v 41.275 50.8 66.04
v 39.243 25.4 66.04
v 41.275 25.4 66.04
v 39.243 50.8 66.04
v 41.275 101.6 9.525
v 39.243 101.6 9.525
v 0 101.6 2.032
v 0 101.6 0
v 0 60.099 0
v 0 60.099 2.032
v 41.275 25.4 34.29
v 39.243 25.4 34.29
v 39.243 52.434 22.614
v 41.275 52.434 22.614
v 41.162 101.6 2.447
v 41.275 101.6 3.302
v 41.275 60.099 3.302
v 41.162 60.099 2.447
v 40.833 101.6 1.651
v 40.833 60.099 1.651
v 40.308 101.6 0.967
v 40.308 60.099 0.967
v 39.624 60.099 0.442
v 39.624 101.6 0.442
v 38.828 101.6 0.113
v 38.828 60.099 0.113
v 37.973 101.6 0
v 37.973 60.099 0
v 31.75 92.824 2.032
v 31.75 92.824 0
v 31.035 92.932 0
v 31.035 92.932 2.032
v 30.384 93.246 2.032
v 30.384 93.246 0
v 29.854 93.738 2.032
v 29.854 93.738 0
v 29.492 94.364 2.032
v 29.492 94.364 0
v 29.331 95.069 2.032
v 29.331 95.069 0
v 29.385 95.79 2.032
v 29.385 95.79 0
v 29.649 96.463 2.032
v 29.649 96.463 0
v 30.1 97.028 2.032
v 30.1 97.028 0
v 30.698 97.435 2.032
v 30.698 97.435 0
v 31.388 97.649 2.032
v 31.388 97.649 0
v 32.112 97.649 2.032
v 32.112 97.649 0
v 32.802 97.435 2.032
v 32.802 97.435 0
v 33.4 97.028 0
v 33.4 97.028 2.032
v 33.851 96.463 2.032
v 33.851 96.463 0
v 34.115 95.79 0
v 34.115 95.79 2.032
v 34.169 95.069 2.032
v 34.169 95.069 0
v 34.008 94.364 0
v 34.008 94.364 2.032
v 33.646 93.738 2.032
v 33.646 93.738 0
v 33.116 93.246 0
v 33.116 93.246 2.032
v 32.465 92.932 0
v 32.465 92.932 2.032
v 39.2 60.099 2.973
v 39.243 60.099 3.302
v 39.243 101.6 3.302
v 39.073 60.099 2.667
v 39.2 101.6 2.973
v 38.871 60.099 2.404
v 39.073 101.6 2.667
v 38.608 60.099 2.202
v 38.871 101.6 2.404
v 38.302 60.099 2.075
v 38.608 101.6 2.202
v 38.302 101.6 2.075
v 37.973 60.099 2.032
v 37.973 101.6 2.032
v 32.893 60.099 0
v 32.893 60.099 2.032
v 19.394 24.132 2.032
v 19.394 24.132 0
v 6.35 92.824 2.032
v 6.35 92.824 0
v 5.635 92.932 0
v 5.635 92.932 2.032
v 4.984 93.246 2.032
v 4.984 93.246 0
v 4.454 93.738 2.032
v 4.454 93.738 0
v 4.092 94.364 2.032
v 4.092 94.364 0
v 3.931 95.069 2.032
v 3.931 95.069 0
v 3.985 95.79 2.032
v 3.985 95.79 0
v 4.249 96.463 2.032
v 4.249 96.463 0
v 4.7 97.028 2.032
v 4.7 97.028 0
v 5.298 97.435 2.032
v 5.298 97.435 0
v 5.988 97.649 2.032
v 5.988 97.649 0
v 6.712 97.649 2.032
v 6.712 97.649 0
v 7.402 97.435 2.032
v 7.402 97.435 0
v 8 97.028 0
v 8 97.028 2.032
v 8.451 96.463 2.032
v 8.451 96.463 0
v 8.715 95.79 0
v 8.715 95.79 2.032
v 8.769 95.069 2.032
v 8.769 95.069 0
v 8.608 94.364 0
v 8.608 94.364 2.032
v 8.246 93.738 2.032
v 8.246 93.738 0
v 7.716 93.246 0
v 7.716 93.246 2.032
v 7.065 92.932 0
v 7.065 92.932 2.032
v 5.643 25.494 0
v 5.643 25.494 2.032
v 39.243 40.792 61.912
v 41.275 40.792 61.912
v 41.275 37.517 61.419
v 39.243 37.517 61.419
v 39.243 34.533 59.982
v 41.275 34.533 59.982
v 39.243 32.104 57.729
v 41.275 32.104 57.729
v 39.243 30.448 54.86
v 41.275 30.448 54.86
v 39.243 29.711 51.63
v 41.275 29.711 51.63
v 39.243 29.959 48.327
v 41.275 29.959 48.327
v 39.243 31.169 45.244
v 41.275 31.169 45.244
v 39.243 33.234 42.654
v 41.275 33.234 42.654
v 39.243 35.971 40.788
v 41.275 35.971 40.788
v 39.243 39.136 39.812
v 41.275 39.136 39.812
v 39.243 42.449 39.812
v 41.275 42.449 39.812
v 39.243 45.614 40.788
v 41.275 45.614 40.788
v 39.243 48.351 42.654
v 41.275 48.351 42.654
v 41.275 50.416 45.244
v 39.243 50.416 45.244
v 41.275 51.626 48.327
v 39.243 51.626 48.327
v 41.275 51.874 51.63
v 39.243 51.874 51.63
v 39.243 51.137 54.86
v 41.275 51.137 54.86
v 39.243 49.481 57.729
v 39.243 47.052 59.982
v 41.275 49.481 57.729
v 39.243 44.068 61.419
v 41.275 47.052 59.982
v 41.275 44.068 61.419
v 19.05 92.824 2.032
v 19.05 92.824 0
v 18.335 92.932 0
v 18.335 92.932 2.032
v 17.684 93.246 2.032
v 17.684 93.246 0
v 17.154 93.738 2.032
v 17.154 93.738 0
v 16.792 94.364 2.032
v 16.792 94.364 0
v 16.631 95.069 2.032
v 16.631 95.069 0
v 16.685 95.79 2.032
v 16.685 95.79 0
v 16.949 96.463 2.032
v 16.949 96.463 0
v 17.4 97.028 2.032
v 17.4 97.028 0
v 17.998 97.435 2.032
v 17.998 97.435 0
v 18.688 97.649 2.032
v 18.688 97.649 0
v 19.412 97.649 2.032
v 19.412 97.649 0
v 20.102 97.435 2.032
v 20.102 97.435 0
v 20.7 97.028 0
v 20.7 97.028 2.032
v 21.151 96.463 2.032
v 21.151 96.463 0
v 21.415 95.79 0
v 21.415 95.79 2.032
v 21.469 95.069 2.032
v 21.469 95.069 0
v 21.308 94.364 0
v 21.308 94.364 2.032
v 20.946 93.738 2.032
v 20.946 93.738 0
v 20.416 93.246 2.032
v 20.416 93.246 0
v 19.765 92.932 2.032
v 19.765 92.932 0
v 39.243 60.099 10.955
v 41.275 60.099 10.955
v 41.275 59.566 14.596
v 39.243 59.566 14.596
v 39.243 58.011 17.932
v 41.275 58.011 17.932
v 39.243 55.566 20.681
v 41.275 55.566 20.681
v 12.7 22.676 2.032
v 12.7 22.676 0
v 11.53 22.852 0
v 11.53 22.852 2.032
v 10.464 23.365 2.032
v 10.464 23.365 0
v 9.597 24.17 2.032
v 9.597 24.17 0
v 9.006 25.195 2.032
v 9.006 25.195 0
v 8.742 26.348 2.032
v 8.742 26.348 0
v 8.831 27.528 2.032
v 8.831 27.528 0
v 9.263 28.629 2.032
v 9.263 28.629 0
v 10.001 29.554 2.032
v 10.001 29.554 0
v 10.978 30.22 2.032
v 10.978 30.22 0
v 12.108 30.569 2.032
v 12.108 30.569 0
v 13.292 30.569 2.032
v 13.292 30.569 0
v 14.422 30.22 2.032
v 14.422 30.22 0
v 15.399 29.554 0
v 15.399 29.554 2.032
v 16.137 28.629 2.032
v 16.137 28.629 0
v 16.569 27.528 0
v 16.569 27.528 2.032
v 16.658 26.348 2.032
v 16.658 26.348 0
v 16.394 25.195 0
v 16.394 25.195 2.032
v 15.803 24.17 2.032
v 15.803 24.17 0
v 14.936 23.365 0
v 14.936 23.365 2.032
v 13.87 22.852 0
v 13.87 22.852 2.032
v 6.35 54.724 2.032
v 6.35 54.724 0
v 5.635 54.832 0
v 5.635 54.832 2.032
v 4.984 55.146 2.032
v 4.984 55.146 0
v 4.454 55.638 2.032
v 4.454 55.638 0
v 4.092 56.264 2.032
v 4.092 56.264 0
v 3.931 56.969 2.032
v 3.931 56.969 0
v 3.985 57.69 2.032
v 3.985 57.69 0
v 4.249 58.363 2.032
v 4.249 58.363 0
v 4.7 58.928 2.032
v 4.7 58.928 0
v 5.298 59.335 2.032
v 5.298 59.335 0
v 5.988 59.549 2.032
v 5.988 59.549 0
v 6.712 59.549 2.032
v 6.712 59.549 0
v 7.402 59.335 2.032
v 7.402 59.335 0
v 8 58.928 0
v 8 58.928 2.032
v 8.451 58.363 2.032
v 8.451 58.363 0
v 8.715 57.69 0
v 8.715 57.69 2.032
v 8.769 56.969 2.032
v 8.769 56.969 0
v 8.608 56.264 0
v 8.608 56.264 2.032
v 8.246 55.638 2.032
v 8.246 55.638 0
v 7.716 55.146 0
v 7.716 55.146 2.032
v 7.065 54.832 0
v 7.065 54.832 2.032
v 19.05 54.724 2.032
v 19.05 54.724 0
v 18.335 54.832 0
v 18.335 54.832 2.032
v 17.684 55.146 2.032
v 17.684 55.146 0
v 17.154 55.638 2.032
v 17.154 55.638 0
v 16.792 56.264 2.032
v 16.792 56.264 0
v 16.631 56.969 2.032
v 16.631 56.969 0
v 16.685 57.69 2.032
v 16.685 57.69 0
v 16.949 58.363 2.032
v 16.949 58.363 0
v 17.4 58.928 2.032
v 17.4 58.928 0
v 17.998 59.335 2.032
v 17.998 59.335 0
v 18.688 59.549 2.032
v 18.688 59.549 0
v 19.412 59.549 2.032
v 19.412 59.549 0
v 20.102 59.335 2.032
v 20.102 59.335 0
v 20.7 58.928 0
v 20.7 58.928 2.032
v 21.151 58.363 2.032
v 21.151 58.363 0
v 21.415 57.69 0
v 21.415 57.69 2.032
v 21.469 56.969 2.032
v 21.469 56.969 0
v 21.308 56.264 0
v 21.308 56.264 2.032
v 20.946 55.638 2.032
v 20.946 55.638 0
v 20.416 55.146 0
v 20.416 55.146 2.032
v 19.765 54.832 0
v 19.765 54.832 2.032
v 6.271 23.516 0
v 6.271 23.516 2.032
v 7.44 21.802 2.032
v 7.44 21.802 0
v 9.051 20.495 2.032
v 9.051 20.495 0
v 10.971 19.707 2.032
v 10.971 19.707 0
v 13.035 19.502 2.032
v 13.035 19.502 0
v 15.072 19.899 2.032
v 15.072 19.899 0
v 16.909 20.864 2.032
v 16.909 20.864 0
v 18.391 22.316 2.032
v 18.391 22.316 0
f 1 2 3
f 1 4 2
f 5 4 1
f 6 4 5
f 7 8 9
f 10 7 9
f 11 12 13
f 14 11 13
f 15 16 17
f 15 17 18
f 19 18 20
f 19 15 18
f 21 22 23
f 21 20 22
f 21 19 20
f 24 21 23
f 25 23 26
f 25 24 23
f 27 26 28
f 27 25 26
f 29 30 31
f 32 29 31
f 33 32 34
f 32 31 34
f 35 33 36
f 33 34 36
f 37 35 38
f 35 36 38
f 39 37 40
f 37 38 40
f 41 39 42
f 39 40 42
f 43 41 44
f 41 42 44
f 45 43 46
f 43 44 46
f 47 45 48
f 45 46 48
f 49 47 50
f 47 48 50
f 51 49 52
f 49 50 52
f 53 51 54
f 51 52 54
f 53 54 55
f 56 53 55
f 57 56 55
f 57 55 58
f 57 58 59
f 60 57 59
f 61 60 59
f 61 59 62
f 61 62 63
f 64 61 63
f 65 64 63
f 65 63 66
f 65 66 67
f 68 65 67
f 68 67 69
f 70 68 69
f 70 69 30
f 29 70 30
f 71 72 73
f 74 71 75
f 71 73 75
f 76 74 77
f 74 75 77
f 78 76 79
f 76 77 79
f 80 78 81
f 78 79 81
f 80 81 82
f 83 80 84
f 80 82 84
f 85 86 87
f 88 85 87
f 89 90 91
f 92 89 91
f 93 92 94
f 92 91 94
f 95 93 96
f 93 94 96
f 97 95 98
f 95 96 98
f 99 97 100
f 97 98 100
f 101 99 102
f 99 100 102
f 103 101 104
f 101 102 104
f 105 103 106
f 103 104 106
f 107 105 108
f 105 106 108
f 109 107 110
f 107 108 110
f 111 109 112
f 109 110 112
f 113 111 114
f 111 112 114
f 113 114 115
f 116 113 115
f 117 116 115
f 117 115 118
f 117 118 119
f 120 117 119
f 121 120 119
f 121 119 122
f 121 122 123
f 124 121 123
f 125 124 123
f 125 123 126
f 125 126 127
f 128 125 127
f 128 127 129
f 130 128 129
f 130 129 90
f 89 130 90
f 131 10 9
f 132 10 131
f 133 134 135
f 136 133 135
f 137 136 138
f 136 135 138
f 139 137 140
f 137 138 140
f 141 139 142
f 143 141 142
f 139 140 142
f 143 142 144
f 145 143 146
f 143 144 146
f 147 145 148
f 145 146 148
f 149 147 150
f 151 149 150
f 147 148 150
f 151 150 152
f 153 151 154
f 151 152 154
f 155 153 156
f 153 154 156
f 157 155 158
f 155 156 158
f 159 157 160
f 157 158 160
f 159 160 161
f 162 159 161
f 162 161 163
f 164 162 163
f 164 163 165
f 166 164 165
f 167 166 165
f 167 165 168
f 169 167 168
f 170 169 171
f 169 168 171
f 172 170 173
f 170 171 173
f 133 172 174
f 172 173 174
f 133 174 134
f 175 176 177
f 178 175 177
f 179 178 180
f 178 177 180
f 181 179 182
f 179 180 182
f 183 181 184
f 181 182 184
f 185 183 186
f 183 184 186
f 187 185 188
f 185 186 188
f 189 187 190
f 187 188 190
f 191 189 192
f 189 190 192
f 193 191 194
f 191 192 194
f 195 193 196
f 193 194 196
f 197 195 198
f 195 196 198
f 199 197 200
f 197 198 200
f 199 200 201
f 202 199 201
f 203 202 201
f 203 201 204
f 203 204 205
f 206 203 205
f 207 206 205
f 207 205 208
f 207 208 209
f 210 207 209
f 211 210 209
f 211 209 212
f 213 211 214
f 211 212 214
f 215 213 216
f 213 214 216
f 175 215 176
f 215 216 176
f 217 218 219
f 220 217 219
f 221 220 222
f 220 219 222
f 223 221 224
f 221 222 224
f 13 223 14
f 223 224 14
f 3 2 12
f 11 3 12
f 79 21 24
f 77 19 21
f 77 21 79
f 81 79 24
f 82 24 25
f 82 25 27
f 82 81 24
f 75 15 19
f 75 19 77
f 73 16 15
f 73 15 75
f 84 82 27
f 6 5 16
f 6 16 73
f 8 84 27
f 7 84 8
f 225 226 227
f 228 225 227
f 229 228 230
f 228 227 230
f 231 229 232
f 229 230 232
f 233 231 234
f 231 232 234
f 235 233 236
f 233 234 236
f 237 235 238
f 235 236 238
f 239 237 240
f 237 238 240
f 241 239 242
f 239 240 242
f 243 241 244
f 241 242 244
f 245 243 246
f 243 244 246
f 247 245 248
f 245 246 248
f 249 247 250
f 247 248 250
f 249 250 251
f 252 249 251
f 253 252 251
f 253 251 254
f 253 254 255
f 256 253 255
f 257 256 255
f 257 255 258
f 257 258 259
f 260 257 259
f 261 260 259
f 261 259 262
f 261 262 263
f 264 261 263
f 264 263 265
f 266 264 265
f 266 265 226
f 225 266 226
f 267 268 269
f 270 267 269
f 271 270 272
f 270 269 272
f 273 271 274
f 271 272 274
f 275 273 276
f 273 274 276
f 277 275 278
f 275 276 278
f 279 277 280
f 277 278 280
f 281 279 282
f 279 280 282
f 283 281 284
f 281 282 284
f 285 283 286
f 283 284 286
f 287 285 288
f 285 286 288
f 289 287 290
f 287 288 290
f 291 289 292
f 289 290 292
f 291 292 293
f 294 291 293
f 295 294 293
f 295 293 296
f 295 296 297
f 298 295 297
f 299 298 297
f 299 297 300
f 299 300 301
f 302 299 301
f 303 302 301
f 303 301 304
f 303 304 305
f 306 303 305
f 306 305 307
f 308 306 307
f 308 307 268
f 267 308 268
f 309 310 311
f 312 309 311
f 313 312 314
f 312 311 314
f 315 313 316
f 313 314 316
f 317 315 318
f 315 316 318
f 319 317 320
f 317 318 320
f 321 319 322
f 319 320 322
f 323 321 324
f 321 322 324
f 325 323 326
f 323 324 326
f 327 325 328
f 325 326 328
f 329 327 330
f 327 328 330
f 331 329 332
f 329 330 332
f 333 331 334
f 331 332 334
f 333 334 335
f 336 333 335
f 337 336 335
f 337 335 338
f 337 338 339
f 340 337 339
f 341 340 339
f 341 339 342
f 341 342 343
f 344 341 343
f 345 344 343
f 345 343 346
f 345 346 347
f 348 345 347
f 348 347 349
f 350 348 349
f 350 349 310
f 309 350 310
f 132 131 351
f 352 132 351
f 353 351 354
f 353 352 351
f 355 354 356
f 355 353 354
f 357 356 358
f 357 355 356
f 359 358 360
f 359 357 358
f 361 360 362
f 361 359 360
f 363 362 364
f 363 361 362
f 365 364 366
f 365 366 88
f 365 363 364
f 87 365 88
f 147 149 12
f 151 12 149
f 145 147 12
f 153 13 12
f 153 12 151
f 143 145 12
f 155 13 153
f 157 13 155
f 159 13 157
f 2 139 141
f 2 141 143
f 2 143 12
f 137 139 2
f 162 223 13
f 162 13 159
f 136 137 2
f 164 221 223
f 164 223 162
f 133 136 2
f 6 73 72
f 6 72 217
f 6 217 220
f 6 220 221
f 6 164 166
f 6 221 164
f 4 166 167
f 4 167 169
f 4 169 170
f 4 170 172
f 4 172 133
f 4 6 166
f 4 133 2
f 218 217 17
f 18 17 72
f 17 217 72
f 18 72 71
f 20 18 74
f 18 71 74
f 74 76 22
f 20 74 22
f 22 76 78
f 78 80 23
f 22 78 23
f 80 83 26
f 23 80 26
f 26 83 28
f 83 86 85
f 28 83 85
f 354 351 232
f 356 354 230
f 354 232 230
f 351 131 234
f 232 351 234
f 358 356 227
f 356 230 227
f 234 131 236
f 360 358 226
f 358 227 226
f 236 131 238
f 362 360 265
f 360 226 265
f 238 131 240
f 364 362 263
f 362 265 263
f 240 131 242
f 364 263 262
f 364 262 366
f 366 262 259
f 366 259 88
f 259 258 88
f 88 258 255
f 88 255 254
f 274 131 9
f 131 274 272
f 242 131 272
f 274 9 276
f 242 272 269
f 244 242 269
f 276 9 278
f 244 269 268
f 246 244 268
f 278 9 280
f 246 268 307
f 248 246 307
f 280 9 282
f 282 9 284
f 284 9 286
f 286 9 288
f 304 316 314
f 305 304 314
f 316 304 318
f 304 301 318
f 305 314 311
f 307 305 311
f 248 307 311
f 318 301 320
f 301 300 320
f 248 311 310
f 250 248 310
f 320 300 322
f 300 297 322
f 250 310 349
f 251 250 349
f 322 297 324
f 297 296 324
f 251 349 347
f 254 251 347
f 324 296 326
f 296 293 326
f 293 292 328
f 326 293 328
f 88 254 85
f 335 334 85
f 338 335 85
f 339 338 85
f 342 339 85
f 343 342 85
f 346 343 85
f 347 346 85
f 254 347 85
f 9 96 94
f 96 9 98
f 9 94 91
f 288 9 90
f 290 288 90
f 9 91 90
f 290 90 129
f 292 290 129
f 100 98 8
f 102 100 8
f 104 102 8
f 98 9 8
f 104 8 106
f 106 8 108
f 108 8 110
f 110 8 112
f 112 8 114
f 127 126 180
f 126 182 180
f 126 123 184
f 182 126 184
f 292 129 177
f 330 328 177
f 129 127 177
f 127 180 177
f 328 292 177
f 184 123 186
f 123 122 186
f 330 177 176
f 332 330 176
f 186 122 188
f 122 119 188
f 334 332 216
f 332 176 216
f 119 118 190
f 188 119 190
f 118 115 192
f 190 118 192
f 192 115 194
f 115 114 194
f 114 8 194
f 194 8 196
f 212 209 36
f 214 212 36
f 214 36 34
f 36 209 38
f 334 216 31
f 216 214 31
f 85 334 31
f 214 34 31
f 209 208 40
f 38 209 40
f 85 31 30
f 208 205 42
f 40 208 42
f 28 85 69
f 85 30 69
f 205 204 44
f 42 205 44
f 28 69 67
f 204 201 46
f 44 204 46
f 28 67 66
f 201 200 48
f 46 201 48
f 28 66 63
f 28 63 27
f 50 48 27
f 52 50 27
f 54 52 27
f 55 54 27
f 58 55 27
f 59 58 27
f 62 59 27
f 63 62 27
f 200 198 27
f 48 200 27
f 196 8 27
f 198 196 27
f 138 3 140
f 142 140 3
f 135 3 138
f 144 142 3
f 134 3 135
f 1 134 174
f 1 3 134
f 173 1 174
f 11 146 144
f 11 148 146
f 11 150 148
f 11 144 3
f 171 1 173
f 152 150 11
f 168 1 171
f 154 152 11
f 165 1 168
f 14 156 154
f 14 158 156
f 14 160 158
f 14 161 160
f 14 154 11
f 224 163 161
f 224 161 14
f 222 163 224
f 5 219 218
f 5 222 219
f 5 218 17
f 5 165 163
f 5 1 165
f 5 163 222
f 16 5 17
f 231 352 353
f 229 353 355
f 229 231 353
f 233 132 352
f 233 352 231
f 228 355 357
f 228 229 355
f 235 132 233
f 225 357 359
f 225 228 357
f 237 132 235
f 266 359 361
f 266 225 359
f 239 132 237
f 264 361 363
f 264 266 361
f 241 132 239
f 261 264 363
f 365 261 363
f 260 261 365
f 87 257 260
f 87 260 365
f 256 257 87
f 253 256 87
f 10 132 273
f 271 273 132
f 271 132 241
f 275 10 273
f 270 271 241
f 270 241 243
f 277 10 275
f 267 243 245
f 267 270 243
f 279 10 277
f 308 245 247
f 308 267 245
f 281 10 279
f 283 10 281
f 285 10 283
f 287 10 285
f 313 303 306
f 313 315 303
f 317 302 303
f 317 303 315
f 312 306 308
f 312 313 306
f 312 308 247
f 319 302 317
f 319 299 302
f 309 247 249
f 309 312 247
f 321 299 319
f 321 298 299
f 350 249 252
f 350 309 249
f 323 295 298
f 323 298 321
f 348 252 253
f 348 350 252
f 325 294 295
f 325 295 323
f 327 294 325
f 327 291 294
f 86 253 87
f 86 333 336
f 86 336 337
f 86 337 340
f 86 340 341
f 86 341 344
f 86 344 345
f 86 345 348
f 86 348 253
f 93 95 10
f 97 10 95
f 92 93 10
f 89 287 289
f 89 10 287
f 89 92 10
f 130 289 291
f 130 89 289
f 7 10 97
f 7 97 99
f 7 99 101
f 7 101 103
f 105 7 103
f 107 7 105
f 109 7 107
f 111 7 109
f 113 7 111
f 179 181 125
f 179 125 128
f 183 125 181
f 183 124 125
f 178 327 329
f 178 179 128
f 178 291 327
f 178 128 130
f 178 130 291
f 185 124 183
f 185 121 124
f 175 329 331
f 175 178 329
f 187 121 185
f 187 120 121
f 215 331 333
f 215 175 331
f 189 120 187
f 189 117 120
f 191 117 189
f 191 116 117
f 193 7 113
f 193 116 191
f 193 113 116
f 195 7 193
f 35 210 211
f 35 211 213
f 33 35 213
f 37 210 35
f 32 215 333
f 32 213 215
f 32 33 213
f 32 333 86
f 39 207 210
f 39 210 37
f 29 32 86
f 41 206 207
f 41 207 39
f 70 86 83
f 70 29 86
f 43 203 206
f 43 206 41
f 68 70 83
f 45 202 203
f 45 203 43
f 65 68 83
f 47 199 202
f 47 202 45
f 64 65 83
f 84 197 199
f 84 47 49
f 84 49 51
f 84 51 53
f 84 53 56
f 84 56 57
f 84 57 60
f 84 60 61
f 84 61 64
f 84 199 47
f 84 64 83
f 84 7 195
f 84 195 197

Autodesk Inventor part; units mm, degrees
ref_plane "YZ Plane" through (0, 0, 0) normal (1, 0, 0) x (0, 1, 0)
ref_plane "XZ Plane" through (0, 0, 0) normal (0, 1, 0) x (-1, 0, 0)
ref_plane "XY Plane" through (0, 0, 0) normal (0, 0, 1) x (1, 0, 0)
sketch "Sketch1" plane through (0, 0, 0) normal (0, 0, 1) x (1, 0, 0)
  line L0 (0, 0) -> (41.275, 0)
  line L1 (41.275, 0) -> (41.275, 101.6)
  line L2 (41.275, 101.6) -> (0, 101.6)
  line L3 (0, 101.6) -> (0, 0)
  dimension "d0" = 101.6
  dimension "d1" = 41.275
extrude "Plate1" add sketch "Sketch1" along normal blind 2.032
sketch "Sketch2" plane through (39.243, 101.6, 0) normal (1, 0, 0) x (0, 1, 0)
  line L0 (-101.6, 0) -> (0, 0)
  line L1 (0, 0) -> (0, 66.04)
  line L2 (0, 66.04) -> (-101.6, 66.04)
  line L3 (-101.6, 66.04) -> (-101.6, 0)
edge flange "Flange1" height 66.04 angle 90 thickness 2.032 bend radius 1.27 thickness toward (1, 0, 0) relief tear relief width 2.032 relief depth 1.016 edges at (41.275, 50.8, 2.032) wall of the first edge with corners at (39.243, 0, 0) (39.243, 101.6, 0) (39.243, 101.6, 66.04) (39.243, 0, 66.04)
bend "Bend1"
corner "Corner1"
sketch "Sketch3" plane through (0, 0, 2.032) normal (0, 0, 1) x (1, 0, 0)
  line L0 (0, 0) -> (0, 101.6) projected
  line L1 (0, 101.6) -> (37.973, 101.6) projected
  point P0 (6.35, 95.25)
  point P1 (6.35, 57.15)
  point P2 (19.05, 95.25)
  point P3 (31.75, 95.25)
  point P4 (19.05, 57.15)
  dimension "d13" = 6.35
  dimension "d14" = 6.35
  dimension "d15" = 38.1
  dimension "d16" = 12.7
  dimension "d17" = 12.7
hole "Hole1" at (6.35, 95.25, 2.032) at (6.35, 57.15, 2.032) at (19.05, 95.25, 2.032) at (31.75, 95.25, 2.032) at (19.05, 57.15, 2.032) direction (0, 0, -1) diameter 4.8514 end through all
sketch "Sketch4" plane through (0, 0, 2.032) normal (0, 0, 1) x (1, 0, 0)
  line L0 (0, 101.6) -> (37.973, 101.6) projected
  line L1 (0, 0) -> (0, 101.6) projected
  point P0 (12.7, 26.6446)
  dimension "d25" = 74.9554
  dimension "d26" = 12.7
hole "Hole2" at (12.7, 26.6446, 2.032) direction (0, 0, -1) diameter 7.9375 end through all
sketch "Sketch5" plane through (0, 0, 2.032) normal (0, 0, 1) x (1, 0, 0)
  circle A0 centre (12.7, 26.6446) radius 3.9687 projected
  arc A1 (5.6431, 25.4938) -> (19.3942, 24.1322) centre (12.7, 26.6446) ccw
  line L0 (37.973, 101.6) -> (37.973, 0) projected
  line L1 (0, 101.6) -> (37.973, 101.6) projected
  line L2 (39.243, 101.6) -> (39.243, 0) projected
  line L3 (39.243, 60.0989) -> (32.893, 60.0989)
  line L4 (32.893, 60.0989) -> (19.3942, 24.1322)
  line L5 (0, 60.0989) -> (5.6431, 25.4938)
  line L6 (0, 0) -> (0, 101.6) projected
  line L7 (37.973, 0) -> (0, 0) projected
  line L8 (0, 60.0989) -> (0, 0)
  line L9 (0, 0) -> (39.243, 0)
  dimension "d34" = 14.3002
  dimension "d37" = 6.35
  dimension "d38" = 41.5011
extrude "Extrusion1" cut sketch "Sketch5" against normal through all contours A1 L4 L3 L0 L7 L6 L5 | L3 L2 L9 L0
sketch "Sketch6" plane through (39.243, 0, 66.04) normal (-1, 0, 0) x (0, 0, 1)
  line L0 (-66.04, 101.6) -> (-66.04, 60.0989) projected
  line L1 (-62.738, 101.6) -> (0, 101.6) projected
  point P0 (-66.04, 0)
  point P1 (-15.24, 40.7924)
  dimension "d41" = 50.8
  dimension "d42" = 60.8076
hole "Hole3" at (39.243, 40.7924, 50.8) direction (1, 0, 0) diameter 22.225 end through all
sketch "Sketch7" plane through (39.243, 0, 66.04) normal (-1, 0, 0) x (0, 0, 1)
  line L0 (0, 0) -> (0, 101.6) projected
  line L1 (0, 25.4) -> (-31.75, 25.4)
  line L2 (-62.738, 101.6) -> (0, 101.6) projected
  line L3 (-64.008, 60.0989) -> (-65.786, 60.0989) projected
  line L4 (-65.786, 60.0989) -> (-46.736, 60.0989)
  line L5 (-31.75, 25.4) -> (-46.736, 60.0989)
  line L6 (0, 25.4) -> (0, 0)
  line L7 (-65.786, 0) -> (-65.786, 60.0989) projected
  line L8 (-65.786, 0) -> (-65.786, 60.0989)
  line L9 (0, 0) -> (-65.786, 0)
  point P0 (-66.04, 0)
  dimension "d50" = 76.2
  dimension "d51" = 31.75
  dimension "d54" = 19.05
extrude "Extrusion2" cut sketch "Sketch7" against normal blind 6.35 and the other way blind 6.35
fillet "Fillet1" radius 12.7 1 edges at (40.259, 60.0989, 19.304)
sketch "Sketch8" plane through (39.243, 101.6, 3.302) normal (-1, 0, 0) x (0, 0, 1)
  line L0 (62.738, -76.2) -> (62.738, 0) projected
  line L1 (62.738, -50.8) -> (62.738, 0)
  line L2 (62.738, 0) -> (6.223, 0)
  line L3 (62.738, 0) -> (0, 0) projected
  line L4 (62.738, -50.8) -> (6.223, 0)
  line L5 (-3.302, 0) -> (-3.302, -41.5011) projected
  point P0 (-3.302, -101.6)
  dimension "d60" = 50.8
  dimension "d61" = 9.525
extrude "Extrusion3" cut sketch "Sketch8" against normal through all
equation "\"d23\" = Thickness"
equation "\"d32\" = Thickness"
equation "\"d48\" = Thickness"
equation "\"d2\" = Thickness"
equation "\"d3\" = BendReliefWidth"
equation "\"d4\" = BendReliefDepth"
equation "\"d5\" = MinimumRemnant"
equation "\"d6\" = TransitionRadius"
equation "\"d9\" = BendRadius"
equation "\"d10\" = CornerReliefSize"
equation "\"d11\" = GapSize"
equation "\"d12\" = JacobiRadiusSize"
equation "\"BendReliefWidth\" = Thickness"
equation "\"BendReliefDepth\" = 0.5 * Thickness"
equation "\"CornerReliefSize\" = 4 * Thickness"
equation "\"MinimumRemnant\" = 2 * Thickness"
equation "\"TransitionRadius\" = BendRadius"
equation "\"JacobiRadiusSize\" = BendRadius"
equation "\"GapSize\" = Thickness"
equation "\"Thickness\" = 2.032"
equation "\"BendRadius\" = 1.27"
properties part number "Roller bracket" material "Aluminum 6061"
